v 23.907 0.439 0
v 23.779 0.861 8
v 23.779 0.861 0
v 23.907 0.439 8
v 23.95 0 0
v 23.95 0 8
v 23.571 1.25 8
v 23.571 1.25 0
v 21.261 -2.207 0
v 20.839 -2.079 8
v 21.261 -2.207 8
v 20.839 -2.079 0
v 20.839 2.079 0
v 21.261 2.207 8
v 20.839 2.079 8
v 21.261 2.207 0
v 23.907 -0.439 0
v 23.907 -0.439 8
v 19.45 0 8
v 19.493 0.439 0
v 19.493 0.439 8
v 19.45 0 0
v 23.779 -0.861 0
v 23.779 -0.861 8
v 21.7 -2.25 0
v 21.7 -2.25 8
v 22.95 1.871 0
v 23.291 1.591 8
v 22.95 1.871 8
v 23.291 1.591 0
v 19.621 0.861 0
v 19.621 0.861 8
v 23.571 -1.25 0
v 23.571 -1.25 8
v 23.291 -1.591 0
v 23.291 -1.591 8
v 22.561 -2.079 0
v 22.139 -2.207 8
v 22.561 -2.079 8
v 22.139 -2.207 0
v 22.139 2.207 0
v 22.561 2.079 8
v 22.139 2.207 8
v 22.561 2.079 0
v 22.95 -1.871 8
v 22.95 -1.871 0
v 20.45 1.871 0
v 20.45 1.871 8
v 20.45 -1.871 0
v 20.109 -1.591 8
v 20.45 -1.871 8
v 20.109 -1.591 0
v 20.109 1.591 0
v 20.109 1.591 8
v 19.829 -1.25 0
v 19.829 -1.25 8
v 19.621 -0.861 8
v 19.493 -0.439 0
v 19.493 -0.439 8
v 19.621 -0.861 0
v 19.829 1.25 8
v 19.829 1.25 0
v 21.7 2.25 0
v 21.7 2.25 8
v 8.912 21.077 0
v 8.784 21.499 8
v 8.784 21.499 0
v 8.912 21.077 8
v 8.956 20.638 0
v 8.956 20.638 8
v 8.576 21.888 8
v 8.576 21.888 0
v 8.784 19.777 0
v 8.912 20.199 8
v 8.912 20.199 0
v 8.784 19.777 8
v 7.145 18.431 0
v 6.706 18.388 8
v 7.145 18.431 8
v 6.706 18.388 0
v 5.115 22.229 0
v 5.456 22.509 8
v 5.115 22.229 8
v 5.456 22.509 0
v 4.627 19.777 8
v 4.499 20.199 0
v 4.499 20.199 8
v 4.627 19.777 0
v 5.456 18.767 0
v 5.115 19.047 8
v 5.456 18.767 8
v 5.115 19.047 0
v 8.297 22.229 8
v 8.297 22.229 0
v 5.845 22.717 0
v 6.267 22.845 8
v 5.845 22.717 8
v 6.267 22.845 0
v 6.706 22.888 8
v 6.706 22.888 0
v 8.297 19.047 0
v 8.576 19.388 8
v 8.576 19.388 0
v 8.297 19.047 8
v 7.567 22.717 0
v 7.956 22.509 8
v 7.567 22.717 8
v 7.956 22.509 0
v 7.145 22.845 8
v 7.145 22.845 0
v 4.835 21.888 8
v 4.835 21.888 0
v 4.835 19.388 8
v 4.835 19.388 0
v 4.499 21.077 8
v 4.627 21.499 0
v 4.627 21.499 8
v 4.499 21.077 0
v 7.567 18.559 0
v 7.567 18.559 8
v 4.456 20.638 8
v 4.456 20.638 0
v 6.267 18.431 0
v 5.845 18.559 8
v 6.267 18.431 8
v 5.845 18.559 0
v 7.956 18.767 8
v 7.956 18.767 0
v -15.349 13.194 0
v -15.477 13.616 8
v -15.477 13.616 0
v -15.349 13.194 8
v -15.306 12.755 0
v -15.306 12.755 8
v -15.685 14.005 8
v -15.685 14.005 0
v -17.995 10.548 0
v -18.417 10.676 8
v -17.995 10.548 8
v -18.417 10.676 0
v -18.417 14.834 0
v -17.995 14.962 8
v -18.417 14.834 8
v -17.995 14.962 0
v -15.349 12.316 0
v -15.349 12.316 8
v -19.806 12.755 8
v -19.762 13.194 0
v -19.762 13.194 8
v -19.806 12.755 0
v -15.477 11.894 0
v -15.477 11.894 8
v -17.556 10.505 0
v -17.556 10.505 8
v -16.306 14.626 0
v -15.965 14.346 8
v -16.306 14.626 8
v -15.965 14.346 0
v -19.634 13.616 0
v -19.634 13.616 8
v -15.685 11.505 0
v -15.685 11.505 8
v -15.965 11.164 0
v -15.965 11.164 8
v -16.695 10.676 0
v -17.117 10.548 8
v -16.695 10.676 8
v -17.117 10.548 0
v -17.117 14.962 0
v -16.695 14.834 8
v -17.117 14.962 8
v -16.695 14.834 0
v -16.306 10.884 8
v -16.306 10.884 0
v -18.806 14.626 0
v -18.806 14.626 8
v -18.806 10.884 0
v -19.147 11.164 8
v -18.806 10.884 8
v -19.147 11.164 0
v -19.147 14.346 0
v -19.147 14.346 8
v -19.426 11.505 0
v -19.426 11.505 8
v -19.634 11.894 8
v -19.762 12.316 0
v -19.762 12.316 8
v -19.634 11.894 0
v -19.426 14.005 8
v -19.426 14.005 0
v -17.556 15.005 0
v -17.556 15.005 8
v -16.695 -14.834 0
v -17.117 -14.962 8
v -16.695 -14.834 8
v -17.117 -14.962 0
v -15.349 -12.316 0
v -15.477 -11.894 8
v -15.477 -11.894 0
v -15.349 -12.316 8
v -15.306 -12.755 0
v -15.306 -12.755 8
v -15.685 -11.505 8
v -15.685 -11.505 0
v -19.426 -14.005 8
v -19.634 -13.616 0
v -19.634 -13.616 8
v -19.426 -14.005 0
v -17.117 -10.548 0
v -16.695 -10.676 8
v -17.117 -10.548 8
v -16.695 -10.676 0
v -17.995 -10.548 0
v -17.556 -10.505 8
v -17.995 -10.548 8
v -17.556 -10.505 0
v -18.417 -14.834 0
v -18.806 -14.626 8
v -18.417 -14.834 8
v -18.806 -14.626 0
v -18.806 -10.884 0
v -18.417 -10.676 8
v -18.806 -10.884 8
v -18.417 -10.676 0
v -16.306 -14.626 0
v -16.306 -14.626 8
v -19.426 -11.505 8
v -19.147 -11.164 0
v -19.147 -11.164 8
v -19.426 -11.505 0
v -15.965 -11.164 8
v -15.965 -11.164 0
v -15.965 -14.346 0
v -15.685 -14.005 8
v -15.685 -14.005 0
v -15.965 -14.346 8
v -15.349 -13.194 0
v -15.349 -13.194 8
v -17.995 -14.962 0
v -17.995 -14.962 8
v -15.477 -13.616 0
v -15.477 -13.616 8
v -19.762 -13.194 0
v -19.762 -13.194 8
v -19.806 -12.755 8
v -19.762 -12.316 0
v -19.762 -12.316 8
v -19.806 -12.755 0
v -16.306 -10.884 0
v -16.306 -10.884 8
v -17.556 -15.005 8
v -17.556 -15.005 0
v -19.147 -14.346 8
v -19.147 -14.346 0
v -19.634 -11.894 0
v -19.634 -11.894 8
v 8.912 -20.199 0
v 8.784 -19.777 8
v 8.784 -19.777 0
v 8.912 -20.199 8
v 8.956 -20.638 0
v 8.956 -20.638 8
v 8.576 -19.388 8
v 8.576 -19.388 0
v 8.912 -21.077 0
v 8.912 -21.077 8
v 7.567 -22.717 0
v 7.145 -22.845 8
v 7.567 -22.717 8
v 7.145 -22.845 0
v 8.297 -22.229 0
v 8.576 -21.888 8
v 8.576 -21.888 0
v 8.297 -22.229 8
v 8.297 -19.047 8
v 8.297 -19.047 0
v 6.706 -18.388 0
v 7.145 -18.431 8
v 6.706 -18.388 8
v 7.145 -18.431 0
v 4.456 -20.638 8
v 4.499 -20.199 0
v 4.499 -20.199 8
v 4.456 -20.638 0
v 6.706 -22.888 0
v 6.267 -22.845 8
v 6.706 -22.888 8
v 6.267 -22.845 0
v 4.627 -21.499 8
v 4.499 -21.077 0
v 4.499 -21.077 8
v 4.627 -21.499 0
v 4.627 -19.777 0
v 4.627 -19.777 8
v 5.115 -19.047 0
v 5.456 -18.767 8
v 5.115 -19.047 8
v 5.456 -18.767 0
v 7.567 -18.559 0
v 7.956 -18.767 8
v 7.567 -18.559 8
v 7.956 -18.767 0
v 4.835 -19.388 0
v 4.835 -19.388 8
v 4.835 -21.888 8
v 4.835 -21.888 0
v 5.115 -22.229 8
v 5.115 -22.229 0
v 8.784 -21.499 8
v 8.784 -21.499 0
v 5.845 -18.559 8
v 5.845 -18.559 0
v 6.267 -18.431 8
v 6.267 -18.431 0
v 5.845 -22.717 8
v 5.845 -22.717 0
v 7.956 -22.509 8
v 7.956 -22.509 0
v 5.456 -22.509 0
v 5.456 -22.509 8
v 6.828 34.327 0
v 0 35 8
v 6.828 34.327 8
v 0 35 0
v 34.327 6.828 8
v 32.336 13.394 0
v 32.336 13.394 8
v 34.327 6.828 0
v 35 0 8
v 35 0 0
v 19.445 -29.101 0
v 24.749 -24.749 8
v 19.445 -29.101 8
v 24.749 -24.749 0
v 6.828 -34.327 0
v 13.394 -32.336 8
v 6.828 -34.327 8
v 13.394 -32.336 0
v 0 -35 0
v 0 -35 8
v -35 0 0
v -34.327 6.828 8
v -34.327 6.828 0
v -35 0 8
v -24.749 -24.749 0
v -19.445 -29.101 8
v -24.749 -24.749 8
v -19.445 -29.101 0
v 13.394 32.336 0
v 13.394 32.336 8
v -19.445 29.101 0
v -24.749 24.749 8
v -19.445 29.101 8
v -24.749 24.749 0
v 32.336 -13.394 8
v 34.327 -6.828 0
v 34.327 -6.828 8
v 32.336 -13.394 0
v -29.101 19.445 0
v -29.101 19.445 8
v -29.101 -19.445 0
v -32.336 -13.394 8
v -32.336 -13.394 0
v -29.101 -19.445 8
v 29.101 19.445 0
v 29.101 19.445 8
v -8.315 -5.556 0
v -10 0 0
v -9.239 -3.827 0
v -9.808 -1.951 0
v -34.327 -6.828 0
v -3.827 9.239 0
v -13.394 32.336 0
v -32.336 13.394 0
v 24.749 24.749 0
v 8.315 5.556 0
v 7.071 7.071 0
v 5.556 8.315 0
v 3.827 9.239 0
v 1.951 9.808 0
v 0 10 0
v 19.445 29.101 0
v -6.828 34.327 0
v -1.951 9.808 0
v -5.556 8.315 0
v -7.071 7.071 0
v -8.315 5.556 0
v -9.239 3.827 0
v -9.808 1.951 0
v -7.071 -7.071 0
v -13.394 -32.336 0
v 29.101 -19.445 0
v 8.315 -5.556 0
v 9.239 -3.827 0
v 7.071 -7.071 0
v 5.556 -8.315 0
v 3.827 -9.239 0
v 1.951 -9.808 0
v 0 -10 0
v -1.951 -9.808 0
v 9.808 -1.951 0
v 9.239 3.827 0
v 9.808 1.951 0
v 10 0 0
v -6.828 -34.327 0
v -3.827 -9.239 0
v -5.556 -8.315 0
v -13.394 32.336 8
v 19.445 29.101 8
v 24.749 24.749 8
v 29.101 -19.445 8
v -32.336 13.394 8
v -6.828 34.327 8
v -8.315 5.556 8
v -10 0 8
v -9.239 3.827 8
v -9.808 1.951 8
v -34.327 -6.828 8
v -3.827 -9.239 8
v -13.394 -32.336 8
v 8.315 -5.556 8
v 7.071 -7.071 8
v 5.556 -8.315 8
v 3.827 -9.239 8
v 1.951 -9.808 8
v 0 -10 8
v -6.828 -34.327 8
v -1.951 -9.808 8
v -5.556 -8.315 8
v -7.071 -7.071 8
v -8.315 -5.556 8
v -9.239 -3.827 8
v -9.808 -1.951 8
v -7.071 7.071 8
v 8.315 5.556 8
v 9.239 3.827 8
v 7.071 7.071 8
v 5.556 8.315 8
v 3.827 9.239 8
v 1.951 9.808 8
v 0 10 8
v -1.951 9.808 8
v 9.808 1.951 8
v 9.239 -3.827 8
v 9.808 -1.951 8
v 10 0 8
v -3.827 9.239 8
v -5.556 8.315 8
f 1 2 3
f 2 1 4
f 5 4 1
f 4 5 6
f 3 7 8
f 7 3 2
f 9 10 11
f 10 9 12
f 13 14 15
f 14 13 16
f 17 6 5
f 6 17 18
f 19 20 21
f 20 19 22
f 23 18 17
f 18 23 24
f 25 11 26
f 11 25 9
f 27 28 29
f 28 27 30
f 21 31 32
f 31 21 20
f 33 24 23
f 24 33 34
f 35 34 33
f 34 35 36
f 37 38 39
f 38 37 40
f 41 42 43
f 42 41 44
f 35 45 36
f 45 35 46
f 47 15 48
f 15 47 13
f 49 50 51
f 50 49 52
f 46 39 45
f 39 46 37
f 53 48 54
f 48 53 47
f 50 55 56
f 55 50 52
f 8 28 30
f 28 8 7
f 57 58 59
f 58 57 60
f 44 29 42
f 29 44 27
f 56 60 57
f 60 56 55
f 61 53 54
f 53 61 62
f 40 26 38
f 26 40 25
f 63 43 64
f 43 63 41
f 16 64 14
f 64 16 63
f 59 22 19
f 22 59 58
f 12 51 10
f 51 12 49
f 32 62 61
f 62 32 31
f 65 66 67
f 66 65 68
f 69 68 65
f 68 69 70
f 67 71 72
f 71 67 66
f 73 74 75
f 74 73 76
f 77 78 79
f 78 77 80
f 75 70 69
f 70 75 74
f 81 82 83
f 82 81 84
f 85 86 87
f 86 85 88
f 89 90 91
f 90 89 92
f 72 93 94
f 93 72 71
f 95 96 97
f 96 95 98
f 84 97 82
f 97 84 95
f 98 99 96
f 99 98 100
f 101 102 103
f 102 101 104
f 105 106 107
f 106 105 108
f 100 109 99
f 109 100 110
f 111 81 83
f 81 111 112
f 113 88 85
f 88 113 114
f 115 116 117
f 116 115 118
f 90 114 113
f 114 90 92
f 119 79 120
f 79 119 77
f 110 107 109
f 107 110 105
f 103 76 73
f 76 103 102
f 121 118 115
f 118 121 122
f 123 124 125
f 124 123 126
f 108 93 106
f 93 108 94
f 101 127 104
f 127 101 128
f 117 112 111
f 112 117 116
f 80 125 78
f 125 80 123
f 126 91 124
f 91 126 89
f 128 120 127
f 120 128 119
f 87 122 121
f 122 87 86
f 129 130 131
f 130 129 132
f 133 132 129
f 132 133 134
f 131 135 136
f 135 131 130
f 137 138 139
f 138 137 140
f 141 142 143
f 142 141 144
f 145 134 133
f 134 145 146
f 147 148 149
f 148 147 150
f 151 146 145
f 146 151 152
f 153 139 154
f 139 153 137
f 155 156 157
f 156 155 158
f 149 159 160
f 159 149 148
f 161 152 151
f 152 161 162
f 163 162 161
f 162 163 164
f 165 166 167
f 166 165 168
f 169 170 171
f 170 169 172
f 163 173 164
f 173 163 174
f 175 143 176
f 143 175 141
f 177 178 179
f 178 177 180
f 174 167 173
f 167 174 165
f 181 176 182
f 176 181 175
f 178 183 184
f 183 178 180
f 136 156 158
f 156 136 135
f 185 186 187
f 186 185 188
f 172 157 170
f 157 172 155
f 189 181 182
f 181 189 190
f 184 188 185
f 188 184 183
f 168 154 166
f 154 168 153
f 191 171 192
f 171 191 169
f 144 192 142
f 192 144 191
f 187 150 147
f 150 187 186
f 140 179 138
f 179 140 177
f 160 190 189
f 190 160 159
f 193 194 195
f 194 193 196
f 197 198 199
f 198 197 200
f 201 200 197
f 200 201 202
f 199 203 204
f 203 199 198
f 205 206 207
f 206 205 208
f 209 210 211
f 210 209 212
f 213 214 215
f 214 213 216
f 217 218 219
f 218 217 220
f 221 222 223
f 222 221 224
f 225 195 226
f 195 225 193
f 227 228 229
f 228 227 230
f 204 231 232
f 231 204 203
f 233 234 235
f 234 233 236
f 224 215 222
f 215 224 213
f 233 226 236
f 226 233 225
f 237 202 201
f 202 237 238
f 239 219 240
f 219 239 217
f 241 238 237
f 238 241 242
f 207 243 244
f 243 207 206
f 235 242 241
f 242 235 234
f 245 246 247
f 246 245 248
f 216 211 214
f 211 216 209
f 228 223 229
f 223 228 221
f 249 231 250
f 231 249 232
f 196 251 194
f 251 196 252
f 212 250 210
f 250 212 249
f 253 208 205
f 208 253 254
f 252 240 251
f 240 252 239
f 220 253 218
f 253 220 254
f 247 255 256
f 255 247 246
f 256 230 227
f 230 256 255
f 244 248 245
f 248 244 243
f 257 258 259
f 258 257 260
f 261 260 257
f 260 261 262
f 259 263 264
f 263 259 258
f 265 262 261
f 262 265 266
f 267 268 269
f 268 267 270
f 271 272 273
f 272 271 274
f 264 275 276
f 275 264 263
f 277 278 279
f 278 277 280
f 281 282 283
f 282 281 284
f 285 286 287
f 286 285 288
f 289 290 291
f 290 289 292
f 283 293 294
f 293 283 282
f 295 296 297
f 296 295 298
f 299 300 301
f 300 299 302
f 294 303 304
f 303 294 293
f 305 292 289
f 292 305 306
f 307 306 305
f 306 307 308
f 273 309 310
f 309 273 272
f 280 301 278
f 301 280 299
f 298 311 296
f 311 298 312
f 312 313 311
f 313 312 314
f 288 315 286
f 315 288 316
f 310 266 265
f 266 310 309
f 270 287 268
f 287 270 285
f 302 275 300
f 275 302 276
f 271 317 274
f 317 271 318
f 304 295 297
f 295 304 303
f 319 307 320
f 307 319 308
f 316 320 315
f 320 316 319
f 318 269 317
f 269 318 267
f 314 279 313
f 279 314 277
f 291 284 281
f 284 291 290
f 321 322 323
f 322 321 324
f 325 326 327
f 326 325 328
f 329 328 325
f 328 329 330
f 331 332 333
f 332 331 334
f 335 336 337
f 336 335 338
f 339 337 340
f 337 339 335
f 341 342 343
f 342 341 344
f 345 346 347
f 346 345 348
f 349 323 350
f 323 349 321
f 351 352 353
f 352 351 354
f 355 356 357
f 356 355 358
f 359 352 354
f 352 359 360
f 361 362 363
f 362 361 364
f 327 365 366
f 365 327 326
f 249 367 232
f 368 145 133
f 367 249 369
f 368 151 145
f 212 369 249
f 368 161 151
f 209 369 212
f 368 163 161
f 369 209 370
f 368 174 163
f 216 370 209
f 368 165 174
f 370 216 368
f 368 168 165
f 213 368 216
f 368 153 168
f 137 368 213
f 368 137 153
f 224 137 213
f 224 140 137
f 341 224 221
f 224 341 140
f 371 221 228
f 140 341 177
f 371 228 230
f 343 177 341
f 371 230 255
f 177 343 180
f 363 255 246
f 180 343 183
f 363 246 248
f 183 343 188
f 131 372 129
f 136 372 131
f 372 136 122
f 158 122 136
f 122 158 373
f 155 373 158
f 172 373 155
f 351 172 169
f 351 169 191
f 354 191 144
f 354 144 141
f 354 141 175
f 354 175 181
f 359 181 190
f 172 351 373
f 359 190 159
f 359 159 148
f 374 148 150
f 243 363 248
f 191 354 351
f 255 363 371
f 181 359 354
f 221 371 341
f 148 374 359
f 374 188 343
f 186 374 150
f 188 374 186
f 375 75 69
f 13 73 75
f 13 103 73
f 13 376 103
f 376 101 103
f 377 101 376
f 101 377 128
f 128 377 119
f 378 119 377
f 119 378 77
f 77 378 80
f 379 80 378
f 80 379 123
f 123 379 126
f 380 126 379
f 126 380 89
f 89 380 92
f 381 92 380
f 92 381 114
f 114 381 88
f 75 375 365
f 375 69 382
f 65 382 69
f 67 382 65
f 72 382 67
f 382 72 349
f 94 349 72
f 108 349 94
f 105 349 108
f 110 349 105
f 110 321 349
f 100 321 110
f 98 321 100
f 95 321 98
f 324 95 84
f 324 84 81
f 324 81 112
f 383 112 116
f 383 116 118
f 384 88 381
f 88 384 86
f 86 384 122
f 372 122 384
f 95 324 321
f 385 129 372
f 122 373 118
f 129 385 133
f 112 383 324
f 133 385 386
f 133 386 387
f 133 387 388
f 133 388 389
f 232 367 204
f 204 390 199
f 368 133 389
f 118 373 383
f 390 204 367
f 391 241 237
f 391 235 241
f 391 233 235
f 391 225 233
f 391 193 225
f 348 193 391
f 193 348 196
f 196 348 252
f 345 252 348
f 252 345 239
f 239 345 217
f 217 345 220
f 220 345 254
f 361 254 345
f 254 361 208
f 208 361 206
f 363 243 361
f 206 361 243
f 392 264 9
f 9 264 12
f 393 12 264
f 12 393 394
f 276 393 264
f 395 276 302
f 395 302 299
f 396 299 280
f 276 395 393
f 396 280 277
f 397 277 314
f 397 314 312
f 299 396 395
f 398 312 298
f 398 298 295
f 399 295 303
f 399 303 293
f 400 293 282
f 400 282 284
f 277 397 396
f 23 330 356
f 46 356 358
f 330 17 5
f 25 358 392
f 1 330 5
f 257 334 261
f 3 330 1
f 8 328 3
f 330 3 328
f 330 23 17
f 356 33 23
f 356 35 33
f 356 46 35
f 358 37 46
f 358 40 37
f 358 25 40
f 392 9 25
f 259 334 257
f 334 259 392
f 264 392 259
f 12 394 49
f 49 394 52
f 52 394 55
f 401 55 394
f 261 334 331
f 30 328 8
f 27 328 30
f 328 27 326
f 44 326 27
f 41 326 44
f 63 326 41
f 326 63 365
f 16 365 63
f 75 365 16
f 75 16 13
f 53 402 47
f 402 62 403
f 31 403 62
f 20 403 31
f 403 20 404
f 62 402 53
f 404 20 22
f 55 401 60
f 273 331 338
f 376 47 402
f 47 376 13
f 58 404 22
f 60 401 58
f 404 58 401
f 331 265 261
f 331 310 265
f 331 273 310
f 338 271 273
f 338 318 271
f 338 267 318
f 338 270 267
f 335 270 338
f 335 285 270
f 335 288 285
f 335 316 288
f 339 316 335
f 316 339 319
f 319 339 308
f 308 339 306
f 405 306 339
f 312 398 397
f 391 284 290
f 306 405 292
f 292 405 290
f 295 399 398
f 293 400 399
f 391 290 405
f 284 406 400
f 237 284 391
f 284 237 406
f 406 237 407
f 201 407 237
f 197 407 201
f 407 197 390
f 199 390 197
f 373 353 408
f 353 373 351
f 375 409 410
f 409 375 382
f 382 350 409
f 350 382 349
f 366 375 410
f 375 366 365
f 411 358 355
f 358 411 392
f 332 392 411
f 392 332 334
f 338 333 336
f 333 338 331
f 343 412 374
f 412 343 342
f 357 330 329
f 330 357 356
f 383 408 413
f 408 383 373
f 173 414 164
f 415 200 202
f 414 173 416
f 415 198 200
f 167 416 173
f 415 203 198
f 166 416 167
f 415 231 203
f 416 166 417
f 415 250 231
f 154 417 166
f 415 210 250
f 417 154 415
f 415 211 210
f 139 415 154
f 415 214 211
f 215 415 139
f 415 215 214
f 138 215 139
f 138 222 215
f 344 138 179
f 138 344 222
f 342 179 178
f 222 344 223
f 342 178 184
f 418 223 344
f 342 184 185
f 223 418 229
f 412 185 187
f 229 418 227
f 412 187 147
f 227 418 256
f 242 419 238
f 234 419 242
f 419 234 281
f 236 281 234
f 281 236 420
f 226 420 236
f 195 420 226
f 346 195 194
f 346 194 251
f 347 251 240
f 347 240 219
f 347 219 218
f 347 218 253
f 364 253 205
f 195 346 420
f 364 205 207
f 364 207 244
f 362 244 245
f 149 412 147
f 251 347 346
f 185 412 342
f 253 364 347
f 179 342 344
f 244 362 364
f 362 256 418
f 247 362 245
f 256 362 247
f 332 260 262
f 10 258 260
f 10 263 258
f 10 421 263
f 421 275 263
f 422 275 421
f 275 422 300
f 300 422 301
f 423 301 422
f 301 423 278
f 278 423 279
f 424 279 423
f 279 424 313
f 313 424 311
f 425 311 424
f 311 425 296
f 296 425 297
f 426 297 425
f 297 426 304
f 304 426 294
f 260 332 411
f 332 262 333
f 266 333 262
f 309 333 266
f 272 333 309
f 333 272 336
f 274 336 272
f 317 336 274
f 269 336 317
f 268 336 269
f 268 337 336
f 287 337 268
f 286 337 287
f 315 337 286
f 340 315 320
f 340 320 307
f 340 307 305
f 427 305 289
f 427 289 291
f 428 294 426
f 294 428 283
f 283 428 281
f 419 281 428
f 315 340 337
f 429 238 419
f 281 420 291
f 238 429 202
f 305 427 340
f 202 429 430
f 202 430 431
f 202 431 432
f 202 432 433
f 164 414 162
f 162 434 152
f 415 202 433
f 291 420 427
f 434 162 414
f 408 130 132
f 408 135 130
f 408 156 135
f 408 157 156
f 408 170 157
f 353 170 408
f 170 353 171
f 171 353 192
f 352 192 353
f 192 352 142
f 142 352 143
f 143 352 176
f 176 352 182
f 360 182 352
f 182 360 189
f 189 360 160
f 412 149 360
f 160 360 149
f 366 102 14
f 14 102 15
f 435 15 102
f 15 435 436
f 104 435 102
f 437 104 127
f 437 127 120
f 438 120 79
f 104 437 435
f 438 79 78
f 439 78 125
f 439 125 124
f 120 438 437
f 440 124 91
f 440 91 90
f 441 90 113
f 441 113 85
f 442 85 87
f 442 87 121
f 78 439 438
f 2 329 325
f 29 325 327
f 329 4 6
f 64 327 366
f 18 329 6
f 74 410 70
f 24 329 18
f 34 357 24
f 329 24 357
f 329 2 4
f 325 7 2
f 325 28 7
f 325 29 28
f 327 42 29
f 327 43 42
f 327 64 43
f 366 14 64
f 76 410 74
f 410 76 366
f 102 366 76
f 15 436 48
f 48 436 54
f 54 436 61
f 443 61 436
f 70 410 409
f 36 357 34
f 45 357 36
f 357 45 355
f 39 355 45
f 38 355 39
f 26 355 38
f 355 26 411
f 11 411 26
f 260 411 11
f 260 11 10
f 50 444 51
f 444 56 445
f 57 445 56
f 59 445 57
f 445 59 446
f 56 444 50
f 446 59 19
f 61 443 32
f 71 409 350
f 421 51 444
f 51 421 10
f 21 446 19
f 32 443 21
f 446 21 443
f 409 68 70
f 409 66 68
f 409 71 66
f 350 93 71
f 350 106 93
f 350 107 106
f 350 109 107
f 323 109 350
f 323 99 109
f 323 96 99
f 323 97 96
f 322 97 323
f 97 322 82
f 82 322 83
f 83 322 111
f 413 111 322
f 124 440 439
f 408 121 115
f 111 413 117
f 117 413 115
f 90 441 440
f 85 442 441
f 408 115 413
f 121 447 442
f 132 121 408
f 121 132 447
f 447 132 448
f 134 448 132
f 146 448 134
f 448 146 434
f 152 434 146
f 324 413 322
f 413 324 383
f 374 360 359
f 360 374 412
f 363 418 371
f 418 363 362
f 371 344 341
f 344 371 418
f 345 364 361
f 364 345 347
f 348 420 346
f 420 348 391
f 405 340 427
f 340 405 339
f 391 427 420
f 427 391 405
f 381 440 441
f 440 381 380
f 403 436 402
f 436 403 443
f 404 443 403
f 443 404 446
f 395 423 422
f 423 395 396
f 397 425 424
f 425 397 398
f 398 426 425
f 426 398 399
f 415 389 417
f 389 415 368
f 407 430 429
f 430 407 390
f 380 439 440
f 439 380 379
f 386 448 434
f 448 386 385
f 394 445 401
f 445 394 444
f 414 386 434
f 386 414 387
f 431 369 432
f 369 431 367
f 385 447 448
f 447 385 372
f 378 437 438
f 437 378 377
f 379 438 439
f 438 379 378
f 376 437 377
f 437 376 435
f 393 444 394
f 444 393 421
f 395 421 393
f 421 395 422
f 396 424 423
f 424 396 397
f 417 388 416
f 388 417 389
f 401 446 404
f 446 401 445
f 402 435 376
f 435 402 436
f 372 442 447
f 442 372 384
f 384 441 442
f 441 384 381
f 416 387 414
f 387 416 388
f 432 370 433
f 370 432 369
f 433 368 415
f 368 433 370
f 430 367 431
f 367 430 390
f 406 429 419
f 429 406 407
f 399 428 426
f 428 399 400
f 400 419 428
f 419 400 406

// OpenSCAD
$fn = 32;

// ----------------------------------------------------------------------
// Flange Ø70 x 8
// 5 holes on a Ø43.4 bolt circle, bolted joints
// ----------------------------------------------------------------------

// --- parameters (mm) ---
flange_d = 70;  // outside diameter of the flange
thickness = 8;  // flange thickness
holes = 5;      // number of bolt holes
pcd = 43.4;     // bolt circle diameter
start_deg = 0;  // angle of the first hole, from +X
hole_d = 4.5;   // bolt hole diameter
bore_d = 20;    // central through bore
hub_d = 32;     // hub outside diameter
hub_h = 0;      // hub height above the flange face (0 = no hub)

// --- derived feature positions (mm) ---
height = thickness + hub_h;  // = 8   overall height of the part
pcd_r = pcd / 2;             // = 21.7   bolt circle radius
hole_step = 360 / holes;     // = 72   angular pitch
feature_centers = [
  [pcd_r * cos(start_deg + 0 * hole_step), pcd_r * sin(start_deg + 0 * hole_step)],
  [pcd_r * cos(start_deg + 1 * hole_step), pcd_r * sin(start_deg + 1 * hole_step)],
  [pcd_r * cos(start_deg + 2 * hole_step), pcd_r * sin(start_deg + 2 * hole_step)],
  [pcd_r * cos(start_deg + 3 * hole_step), pcd_r * sin(start_deg + 3 * hole_step)],
  [pcd_r * cos(start_deg + 4 * hole_step), pcd_r * sin(start_deg + 4 * hole_step)]
];   // bolt hole centres on the pitch circle

// flange disc, every hole and the bore cut straight through
difference() {
  union() {
    cylinder(d = flange_d, h = thickness);
  }
  translate([0, 0, -1]) cylinder(d = bore_d, h = height + 2);  // bore, through
  for (centre = feature_centers)
    translate([centre[0], centre[1], -1]) cylinder(d = hole_d, h = thickness + 2);
}
